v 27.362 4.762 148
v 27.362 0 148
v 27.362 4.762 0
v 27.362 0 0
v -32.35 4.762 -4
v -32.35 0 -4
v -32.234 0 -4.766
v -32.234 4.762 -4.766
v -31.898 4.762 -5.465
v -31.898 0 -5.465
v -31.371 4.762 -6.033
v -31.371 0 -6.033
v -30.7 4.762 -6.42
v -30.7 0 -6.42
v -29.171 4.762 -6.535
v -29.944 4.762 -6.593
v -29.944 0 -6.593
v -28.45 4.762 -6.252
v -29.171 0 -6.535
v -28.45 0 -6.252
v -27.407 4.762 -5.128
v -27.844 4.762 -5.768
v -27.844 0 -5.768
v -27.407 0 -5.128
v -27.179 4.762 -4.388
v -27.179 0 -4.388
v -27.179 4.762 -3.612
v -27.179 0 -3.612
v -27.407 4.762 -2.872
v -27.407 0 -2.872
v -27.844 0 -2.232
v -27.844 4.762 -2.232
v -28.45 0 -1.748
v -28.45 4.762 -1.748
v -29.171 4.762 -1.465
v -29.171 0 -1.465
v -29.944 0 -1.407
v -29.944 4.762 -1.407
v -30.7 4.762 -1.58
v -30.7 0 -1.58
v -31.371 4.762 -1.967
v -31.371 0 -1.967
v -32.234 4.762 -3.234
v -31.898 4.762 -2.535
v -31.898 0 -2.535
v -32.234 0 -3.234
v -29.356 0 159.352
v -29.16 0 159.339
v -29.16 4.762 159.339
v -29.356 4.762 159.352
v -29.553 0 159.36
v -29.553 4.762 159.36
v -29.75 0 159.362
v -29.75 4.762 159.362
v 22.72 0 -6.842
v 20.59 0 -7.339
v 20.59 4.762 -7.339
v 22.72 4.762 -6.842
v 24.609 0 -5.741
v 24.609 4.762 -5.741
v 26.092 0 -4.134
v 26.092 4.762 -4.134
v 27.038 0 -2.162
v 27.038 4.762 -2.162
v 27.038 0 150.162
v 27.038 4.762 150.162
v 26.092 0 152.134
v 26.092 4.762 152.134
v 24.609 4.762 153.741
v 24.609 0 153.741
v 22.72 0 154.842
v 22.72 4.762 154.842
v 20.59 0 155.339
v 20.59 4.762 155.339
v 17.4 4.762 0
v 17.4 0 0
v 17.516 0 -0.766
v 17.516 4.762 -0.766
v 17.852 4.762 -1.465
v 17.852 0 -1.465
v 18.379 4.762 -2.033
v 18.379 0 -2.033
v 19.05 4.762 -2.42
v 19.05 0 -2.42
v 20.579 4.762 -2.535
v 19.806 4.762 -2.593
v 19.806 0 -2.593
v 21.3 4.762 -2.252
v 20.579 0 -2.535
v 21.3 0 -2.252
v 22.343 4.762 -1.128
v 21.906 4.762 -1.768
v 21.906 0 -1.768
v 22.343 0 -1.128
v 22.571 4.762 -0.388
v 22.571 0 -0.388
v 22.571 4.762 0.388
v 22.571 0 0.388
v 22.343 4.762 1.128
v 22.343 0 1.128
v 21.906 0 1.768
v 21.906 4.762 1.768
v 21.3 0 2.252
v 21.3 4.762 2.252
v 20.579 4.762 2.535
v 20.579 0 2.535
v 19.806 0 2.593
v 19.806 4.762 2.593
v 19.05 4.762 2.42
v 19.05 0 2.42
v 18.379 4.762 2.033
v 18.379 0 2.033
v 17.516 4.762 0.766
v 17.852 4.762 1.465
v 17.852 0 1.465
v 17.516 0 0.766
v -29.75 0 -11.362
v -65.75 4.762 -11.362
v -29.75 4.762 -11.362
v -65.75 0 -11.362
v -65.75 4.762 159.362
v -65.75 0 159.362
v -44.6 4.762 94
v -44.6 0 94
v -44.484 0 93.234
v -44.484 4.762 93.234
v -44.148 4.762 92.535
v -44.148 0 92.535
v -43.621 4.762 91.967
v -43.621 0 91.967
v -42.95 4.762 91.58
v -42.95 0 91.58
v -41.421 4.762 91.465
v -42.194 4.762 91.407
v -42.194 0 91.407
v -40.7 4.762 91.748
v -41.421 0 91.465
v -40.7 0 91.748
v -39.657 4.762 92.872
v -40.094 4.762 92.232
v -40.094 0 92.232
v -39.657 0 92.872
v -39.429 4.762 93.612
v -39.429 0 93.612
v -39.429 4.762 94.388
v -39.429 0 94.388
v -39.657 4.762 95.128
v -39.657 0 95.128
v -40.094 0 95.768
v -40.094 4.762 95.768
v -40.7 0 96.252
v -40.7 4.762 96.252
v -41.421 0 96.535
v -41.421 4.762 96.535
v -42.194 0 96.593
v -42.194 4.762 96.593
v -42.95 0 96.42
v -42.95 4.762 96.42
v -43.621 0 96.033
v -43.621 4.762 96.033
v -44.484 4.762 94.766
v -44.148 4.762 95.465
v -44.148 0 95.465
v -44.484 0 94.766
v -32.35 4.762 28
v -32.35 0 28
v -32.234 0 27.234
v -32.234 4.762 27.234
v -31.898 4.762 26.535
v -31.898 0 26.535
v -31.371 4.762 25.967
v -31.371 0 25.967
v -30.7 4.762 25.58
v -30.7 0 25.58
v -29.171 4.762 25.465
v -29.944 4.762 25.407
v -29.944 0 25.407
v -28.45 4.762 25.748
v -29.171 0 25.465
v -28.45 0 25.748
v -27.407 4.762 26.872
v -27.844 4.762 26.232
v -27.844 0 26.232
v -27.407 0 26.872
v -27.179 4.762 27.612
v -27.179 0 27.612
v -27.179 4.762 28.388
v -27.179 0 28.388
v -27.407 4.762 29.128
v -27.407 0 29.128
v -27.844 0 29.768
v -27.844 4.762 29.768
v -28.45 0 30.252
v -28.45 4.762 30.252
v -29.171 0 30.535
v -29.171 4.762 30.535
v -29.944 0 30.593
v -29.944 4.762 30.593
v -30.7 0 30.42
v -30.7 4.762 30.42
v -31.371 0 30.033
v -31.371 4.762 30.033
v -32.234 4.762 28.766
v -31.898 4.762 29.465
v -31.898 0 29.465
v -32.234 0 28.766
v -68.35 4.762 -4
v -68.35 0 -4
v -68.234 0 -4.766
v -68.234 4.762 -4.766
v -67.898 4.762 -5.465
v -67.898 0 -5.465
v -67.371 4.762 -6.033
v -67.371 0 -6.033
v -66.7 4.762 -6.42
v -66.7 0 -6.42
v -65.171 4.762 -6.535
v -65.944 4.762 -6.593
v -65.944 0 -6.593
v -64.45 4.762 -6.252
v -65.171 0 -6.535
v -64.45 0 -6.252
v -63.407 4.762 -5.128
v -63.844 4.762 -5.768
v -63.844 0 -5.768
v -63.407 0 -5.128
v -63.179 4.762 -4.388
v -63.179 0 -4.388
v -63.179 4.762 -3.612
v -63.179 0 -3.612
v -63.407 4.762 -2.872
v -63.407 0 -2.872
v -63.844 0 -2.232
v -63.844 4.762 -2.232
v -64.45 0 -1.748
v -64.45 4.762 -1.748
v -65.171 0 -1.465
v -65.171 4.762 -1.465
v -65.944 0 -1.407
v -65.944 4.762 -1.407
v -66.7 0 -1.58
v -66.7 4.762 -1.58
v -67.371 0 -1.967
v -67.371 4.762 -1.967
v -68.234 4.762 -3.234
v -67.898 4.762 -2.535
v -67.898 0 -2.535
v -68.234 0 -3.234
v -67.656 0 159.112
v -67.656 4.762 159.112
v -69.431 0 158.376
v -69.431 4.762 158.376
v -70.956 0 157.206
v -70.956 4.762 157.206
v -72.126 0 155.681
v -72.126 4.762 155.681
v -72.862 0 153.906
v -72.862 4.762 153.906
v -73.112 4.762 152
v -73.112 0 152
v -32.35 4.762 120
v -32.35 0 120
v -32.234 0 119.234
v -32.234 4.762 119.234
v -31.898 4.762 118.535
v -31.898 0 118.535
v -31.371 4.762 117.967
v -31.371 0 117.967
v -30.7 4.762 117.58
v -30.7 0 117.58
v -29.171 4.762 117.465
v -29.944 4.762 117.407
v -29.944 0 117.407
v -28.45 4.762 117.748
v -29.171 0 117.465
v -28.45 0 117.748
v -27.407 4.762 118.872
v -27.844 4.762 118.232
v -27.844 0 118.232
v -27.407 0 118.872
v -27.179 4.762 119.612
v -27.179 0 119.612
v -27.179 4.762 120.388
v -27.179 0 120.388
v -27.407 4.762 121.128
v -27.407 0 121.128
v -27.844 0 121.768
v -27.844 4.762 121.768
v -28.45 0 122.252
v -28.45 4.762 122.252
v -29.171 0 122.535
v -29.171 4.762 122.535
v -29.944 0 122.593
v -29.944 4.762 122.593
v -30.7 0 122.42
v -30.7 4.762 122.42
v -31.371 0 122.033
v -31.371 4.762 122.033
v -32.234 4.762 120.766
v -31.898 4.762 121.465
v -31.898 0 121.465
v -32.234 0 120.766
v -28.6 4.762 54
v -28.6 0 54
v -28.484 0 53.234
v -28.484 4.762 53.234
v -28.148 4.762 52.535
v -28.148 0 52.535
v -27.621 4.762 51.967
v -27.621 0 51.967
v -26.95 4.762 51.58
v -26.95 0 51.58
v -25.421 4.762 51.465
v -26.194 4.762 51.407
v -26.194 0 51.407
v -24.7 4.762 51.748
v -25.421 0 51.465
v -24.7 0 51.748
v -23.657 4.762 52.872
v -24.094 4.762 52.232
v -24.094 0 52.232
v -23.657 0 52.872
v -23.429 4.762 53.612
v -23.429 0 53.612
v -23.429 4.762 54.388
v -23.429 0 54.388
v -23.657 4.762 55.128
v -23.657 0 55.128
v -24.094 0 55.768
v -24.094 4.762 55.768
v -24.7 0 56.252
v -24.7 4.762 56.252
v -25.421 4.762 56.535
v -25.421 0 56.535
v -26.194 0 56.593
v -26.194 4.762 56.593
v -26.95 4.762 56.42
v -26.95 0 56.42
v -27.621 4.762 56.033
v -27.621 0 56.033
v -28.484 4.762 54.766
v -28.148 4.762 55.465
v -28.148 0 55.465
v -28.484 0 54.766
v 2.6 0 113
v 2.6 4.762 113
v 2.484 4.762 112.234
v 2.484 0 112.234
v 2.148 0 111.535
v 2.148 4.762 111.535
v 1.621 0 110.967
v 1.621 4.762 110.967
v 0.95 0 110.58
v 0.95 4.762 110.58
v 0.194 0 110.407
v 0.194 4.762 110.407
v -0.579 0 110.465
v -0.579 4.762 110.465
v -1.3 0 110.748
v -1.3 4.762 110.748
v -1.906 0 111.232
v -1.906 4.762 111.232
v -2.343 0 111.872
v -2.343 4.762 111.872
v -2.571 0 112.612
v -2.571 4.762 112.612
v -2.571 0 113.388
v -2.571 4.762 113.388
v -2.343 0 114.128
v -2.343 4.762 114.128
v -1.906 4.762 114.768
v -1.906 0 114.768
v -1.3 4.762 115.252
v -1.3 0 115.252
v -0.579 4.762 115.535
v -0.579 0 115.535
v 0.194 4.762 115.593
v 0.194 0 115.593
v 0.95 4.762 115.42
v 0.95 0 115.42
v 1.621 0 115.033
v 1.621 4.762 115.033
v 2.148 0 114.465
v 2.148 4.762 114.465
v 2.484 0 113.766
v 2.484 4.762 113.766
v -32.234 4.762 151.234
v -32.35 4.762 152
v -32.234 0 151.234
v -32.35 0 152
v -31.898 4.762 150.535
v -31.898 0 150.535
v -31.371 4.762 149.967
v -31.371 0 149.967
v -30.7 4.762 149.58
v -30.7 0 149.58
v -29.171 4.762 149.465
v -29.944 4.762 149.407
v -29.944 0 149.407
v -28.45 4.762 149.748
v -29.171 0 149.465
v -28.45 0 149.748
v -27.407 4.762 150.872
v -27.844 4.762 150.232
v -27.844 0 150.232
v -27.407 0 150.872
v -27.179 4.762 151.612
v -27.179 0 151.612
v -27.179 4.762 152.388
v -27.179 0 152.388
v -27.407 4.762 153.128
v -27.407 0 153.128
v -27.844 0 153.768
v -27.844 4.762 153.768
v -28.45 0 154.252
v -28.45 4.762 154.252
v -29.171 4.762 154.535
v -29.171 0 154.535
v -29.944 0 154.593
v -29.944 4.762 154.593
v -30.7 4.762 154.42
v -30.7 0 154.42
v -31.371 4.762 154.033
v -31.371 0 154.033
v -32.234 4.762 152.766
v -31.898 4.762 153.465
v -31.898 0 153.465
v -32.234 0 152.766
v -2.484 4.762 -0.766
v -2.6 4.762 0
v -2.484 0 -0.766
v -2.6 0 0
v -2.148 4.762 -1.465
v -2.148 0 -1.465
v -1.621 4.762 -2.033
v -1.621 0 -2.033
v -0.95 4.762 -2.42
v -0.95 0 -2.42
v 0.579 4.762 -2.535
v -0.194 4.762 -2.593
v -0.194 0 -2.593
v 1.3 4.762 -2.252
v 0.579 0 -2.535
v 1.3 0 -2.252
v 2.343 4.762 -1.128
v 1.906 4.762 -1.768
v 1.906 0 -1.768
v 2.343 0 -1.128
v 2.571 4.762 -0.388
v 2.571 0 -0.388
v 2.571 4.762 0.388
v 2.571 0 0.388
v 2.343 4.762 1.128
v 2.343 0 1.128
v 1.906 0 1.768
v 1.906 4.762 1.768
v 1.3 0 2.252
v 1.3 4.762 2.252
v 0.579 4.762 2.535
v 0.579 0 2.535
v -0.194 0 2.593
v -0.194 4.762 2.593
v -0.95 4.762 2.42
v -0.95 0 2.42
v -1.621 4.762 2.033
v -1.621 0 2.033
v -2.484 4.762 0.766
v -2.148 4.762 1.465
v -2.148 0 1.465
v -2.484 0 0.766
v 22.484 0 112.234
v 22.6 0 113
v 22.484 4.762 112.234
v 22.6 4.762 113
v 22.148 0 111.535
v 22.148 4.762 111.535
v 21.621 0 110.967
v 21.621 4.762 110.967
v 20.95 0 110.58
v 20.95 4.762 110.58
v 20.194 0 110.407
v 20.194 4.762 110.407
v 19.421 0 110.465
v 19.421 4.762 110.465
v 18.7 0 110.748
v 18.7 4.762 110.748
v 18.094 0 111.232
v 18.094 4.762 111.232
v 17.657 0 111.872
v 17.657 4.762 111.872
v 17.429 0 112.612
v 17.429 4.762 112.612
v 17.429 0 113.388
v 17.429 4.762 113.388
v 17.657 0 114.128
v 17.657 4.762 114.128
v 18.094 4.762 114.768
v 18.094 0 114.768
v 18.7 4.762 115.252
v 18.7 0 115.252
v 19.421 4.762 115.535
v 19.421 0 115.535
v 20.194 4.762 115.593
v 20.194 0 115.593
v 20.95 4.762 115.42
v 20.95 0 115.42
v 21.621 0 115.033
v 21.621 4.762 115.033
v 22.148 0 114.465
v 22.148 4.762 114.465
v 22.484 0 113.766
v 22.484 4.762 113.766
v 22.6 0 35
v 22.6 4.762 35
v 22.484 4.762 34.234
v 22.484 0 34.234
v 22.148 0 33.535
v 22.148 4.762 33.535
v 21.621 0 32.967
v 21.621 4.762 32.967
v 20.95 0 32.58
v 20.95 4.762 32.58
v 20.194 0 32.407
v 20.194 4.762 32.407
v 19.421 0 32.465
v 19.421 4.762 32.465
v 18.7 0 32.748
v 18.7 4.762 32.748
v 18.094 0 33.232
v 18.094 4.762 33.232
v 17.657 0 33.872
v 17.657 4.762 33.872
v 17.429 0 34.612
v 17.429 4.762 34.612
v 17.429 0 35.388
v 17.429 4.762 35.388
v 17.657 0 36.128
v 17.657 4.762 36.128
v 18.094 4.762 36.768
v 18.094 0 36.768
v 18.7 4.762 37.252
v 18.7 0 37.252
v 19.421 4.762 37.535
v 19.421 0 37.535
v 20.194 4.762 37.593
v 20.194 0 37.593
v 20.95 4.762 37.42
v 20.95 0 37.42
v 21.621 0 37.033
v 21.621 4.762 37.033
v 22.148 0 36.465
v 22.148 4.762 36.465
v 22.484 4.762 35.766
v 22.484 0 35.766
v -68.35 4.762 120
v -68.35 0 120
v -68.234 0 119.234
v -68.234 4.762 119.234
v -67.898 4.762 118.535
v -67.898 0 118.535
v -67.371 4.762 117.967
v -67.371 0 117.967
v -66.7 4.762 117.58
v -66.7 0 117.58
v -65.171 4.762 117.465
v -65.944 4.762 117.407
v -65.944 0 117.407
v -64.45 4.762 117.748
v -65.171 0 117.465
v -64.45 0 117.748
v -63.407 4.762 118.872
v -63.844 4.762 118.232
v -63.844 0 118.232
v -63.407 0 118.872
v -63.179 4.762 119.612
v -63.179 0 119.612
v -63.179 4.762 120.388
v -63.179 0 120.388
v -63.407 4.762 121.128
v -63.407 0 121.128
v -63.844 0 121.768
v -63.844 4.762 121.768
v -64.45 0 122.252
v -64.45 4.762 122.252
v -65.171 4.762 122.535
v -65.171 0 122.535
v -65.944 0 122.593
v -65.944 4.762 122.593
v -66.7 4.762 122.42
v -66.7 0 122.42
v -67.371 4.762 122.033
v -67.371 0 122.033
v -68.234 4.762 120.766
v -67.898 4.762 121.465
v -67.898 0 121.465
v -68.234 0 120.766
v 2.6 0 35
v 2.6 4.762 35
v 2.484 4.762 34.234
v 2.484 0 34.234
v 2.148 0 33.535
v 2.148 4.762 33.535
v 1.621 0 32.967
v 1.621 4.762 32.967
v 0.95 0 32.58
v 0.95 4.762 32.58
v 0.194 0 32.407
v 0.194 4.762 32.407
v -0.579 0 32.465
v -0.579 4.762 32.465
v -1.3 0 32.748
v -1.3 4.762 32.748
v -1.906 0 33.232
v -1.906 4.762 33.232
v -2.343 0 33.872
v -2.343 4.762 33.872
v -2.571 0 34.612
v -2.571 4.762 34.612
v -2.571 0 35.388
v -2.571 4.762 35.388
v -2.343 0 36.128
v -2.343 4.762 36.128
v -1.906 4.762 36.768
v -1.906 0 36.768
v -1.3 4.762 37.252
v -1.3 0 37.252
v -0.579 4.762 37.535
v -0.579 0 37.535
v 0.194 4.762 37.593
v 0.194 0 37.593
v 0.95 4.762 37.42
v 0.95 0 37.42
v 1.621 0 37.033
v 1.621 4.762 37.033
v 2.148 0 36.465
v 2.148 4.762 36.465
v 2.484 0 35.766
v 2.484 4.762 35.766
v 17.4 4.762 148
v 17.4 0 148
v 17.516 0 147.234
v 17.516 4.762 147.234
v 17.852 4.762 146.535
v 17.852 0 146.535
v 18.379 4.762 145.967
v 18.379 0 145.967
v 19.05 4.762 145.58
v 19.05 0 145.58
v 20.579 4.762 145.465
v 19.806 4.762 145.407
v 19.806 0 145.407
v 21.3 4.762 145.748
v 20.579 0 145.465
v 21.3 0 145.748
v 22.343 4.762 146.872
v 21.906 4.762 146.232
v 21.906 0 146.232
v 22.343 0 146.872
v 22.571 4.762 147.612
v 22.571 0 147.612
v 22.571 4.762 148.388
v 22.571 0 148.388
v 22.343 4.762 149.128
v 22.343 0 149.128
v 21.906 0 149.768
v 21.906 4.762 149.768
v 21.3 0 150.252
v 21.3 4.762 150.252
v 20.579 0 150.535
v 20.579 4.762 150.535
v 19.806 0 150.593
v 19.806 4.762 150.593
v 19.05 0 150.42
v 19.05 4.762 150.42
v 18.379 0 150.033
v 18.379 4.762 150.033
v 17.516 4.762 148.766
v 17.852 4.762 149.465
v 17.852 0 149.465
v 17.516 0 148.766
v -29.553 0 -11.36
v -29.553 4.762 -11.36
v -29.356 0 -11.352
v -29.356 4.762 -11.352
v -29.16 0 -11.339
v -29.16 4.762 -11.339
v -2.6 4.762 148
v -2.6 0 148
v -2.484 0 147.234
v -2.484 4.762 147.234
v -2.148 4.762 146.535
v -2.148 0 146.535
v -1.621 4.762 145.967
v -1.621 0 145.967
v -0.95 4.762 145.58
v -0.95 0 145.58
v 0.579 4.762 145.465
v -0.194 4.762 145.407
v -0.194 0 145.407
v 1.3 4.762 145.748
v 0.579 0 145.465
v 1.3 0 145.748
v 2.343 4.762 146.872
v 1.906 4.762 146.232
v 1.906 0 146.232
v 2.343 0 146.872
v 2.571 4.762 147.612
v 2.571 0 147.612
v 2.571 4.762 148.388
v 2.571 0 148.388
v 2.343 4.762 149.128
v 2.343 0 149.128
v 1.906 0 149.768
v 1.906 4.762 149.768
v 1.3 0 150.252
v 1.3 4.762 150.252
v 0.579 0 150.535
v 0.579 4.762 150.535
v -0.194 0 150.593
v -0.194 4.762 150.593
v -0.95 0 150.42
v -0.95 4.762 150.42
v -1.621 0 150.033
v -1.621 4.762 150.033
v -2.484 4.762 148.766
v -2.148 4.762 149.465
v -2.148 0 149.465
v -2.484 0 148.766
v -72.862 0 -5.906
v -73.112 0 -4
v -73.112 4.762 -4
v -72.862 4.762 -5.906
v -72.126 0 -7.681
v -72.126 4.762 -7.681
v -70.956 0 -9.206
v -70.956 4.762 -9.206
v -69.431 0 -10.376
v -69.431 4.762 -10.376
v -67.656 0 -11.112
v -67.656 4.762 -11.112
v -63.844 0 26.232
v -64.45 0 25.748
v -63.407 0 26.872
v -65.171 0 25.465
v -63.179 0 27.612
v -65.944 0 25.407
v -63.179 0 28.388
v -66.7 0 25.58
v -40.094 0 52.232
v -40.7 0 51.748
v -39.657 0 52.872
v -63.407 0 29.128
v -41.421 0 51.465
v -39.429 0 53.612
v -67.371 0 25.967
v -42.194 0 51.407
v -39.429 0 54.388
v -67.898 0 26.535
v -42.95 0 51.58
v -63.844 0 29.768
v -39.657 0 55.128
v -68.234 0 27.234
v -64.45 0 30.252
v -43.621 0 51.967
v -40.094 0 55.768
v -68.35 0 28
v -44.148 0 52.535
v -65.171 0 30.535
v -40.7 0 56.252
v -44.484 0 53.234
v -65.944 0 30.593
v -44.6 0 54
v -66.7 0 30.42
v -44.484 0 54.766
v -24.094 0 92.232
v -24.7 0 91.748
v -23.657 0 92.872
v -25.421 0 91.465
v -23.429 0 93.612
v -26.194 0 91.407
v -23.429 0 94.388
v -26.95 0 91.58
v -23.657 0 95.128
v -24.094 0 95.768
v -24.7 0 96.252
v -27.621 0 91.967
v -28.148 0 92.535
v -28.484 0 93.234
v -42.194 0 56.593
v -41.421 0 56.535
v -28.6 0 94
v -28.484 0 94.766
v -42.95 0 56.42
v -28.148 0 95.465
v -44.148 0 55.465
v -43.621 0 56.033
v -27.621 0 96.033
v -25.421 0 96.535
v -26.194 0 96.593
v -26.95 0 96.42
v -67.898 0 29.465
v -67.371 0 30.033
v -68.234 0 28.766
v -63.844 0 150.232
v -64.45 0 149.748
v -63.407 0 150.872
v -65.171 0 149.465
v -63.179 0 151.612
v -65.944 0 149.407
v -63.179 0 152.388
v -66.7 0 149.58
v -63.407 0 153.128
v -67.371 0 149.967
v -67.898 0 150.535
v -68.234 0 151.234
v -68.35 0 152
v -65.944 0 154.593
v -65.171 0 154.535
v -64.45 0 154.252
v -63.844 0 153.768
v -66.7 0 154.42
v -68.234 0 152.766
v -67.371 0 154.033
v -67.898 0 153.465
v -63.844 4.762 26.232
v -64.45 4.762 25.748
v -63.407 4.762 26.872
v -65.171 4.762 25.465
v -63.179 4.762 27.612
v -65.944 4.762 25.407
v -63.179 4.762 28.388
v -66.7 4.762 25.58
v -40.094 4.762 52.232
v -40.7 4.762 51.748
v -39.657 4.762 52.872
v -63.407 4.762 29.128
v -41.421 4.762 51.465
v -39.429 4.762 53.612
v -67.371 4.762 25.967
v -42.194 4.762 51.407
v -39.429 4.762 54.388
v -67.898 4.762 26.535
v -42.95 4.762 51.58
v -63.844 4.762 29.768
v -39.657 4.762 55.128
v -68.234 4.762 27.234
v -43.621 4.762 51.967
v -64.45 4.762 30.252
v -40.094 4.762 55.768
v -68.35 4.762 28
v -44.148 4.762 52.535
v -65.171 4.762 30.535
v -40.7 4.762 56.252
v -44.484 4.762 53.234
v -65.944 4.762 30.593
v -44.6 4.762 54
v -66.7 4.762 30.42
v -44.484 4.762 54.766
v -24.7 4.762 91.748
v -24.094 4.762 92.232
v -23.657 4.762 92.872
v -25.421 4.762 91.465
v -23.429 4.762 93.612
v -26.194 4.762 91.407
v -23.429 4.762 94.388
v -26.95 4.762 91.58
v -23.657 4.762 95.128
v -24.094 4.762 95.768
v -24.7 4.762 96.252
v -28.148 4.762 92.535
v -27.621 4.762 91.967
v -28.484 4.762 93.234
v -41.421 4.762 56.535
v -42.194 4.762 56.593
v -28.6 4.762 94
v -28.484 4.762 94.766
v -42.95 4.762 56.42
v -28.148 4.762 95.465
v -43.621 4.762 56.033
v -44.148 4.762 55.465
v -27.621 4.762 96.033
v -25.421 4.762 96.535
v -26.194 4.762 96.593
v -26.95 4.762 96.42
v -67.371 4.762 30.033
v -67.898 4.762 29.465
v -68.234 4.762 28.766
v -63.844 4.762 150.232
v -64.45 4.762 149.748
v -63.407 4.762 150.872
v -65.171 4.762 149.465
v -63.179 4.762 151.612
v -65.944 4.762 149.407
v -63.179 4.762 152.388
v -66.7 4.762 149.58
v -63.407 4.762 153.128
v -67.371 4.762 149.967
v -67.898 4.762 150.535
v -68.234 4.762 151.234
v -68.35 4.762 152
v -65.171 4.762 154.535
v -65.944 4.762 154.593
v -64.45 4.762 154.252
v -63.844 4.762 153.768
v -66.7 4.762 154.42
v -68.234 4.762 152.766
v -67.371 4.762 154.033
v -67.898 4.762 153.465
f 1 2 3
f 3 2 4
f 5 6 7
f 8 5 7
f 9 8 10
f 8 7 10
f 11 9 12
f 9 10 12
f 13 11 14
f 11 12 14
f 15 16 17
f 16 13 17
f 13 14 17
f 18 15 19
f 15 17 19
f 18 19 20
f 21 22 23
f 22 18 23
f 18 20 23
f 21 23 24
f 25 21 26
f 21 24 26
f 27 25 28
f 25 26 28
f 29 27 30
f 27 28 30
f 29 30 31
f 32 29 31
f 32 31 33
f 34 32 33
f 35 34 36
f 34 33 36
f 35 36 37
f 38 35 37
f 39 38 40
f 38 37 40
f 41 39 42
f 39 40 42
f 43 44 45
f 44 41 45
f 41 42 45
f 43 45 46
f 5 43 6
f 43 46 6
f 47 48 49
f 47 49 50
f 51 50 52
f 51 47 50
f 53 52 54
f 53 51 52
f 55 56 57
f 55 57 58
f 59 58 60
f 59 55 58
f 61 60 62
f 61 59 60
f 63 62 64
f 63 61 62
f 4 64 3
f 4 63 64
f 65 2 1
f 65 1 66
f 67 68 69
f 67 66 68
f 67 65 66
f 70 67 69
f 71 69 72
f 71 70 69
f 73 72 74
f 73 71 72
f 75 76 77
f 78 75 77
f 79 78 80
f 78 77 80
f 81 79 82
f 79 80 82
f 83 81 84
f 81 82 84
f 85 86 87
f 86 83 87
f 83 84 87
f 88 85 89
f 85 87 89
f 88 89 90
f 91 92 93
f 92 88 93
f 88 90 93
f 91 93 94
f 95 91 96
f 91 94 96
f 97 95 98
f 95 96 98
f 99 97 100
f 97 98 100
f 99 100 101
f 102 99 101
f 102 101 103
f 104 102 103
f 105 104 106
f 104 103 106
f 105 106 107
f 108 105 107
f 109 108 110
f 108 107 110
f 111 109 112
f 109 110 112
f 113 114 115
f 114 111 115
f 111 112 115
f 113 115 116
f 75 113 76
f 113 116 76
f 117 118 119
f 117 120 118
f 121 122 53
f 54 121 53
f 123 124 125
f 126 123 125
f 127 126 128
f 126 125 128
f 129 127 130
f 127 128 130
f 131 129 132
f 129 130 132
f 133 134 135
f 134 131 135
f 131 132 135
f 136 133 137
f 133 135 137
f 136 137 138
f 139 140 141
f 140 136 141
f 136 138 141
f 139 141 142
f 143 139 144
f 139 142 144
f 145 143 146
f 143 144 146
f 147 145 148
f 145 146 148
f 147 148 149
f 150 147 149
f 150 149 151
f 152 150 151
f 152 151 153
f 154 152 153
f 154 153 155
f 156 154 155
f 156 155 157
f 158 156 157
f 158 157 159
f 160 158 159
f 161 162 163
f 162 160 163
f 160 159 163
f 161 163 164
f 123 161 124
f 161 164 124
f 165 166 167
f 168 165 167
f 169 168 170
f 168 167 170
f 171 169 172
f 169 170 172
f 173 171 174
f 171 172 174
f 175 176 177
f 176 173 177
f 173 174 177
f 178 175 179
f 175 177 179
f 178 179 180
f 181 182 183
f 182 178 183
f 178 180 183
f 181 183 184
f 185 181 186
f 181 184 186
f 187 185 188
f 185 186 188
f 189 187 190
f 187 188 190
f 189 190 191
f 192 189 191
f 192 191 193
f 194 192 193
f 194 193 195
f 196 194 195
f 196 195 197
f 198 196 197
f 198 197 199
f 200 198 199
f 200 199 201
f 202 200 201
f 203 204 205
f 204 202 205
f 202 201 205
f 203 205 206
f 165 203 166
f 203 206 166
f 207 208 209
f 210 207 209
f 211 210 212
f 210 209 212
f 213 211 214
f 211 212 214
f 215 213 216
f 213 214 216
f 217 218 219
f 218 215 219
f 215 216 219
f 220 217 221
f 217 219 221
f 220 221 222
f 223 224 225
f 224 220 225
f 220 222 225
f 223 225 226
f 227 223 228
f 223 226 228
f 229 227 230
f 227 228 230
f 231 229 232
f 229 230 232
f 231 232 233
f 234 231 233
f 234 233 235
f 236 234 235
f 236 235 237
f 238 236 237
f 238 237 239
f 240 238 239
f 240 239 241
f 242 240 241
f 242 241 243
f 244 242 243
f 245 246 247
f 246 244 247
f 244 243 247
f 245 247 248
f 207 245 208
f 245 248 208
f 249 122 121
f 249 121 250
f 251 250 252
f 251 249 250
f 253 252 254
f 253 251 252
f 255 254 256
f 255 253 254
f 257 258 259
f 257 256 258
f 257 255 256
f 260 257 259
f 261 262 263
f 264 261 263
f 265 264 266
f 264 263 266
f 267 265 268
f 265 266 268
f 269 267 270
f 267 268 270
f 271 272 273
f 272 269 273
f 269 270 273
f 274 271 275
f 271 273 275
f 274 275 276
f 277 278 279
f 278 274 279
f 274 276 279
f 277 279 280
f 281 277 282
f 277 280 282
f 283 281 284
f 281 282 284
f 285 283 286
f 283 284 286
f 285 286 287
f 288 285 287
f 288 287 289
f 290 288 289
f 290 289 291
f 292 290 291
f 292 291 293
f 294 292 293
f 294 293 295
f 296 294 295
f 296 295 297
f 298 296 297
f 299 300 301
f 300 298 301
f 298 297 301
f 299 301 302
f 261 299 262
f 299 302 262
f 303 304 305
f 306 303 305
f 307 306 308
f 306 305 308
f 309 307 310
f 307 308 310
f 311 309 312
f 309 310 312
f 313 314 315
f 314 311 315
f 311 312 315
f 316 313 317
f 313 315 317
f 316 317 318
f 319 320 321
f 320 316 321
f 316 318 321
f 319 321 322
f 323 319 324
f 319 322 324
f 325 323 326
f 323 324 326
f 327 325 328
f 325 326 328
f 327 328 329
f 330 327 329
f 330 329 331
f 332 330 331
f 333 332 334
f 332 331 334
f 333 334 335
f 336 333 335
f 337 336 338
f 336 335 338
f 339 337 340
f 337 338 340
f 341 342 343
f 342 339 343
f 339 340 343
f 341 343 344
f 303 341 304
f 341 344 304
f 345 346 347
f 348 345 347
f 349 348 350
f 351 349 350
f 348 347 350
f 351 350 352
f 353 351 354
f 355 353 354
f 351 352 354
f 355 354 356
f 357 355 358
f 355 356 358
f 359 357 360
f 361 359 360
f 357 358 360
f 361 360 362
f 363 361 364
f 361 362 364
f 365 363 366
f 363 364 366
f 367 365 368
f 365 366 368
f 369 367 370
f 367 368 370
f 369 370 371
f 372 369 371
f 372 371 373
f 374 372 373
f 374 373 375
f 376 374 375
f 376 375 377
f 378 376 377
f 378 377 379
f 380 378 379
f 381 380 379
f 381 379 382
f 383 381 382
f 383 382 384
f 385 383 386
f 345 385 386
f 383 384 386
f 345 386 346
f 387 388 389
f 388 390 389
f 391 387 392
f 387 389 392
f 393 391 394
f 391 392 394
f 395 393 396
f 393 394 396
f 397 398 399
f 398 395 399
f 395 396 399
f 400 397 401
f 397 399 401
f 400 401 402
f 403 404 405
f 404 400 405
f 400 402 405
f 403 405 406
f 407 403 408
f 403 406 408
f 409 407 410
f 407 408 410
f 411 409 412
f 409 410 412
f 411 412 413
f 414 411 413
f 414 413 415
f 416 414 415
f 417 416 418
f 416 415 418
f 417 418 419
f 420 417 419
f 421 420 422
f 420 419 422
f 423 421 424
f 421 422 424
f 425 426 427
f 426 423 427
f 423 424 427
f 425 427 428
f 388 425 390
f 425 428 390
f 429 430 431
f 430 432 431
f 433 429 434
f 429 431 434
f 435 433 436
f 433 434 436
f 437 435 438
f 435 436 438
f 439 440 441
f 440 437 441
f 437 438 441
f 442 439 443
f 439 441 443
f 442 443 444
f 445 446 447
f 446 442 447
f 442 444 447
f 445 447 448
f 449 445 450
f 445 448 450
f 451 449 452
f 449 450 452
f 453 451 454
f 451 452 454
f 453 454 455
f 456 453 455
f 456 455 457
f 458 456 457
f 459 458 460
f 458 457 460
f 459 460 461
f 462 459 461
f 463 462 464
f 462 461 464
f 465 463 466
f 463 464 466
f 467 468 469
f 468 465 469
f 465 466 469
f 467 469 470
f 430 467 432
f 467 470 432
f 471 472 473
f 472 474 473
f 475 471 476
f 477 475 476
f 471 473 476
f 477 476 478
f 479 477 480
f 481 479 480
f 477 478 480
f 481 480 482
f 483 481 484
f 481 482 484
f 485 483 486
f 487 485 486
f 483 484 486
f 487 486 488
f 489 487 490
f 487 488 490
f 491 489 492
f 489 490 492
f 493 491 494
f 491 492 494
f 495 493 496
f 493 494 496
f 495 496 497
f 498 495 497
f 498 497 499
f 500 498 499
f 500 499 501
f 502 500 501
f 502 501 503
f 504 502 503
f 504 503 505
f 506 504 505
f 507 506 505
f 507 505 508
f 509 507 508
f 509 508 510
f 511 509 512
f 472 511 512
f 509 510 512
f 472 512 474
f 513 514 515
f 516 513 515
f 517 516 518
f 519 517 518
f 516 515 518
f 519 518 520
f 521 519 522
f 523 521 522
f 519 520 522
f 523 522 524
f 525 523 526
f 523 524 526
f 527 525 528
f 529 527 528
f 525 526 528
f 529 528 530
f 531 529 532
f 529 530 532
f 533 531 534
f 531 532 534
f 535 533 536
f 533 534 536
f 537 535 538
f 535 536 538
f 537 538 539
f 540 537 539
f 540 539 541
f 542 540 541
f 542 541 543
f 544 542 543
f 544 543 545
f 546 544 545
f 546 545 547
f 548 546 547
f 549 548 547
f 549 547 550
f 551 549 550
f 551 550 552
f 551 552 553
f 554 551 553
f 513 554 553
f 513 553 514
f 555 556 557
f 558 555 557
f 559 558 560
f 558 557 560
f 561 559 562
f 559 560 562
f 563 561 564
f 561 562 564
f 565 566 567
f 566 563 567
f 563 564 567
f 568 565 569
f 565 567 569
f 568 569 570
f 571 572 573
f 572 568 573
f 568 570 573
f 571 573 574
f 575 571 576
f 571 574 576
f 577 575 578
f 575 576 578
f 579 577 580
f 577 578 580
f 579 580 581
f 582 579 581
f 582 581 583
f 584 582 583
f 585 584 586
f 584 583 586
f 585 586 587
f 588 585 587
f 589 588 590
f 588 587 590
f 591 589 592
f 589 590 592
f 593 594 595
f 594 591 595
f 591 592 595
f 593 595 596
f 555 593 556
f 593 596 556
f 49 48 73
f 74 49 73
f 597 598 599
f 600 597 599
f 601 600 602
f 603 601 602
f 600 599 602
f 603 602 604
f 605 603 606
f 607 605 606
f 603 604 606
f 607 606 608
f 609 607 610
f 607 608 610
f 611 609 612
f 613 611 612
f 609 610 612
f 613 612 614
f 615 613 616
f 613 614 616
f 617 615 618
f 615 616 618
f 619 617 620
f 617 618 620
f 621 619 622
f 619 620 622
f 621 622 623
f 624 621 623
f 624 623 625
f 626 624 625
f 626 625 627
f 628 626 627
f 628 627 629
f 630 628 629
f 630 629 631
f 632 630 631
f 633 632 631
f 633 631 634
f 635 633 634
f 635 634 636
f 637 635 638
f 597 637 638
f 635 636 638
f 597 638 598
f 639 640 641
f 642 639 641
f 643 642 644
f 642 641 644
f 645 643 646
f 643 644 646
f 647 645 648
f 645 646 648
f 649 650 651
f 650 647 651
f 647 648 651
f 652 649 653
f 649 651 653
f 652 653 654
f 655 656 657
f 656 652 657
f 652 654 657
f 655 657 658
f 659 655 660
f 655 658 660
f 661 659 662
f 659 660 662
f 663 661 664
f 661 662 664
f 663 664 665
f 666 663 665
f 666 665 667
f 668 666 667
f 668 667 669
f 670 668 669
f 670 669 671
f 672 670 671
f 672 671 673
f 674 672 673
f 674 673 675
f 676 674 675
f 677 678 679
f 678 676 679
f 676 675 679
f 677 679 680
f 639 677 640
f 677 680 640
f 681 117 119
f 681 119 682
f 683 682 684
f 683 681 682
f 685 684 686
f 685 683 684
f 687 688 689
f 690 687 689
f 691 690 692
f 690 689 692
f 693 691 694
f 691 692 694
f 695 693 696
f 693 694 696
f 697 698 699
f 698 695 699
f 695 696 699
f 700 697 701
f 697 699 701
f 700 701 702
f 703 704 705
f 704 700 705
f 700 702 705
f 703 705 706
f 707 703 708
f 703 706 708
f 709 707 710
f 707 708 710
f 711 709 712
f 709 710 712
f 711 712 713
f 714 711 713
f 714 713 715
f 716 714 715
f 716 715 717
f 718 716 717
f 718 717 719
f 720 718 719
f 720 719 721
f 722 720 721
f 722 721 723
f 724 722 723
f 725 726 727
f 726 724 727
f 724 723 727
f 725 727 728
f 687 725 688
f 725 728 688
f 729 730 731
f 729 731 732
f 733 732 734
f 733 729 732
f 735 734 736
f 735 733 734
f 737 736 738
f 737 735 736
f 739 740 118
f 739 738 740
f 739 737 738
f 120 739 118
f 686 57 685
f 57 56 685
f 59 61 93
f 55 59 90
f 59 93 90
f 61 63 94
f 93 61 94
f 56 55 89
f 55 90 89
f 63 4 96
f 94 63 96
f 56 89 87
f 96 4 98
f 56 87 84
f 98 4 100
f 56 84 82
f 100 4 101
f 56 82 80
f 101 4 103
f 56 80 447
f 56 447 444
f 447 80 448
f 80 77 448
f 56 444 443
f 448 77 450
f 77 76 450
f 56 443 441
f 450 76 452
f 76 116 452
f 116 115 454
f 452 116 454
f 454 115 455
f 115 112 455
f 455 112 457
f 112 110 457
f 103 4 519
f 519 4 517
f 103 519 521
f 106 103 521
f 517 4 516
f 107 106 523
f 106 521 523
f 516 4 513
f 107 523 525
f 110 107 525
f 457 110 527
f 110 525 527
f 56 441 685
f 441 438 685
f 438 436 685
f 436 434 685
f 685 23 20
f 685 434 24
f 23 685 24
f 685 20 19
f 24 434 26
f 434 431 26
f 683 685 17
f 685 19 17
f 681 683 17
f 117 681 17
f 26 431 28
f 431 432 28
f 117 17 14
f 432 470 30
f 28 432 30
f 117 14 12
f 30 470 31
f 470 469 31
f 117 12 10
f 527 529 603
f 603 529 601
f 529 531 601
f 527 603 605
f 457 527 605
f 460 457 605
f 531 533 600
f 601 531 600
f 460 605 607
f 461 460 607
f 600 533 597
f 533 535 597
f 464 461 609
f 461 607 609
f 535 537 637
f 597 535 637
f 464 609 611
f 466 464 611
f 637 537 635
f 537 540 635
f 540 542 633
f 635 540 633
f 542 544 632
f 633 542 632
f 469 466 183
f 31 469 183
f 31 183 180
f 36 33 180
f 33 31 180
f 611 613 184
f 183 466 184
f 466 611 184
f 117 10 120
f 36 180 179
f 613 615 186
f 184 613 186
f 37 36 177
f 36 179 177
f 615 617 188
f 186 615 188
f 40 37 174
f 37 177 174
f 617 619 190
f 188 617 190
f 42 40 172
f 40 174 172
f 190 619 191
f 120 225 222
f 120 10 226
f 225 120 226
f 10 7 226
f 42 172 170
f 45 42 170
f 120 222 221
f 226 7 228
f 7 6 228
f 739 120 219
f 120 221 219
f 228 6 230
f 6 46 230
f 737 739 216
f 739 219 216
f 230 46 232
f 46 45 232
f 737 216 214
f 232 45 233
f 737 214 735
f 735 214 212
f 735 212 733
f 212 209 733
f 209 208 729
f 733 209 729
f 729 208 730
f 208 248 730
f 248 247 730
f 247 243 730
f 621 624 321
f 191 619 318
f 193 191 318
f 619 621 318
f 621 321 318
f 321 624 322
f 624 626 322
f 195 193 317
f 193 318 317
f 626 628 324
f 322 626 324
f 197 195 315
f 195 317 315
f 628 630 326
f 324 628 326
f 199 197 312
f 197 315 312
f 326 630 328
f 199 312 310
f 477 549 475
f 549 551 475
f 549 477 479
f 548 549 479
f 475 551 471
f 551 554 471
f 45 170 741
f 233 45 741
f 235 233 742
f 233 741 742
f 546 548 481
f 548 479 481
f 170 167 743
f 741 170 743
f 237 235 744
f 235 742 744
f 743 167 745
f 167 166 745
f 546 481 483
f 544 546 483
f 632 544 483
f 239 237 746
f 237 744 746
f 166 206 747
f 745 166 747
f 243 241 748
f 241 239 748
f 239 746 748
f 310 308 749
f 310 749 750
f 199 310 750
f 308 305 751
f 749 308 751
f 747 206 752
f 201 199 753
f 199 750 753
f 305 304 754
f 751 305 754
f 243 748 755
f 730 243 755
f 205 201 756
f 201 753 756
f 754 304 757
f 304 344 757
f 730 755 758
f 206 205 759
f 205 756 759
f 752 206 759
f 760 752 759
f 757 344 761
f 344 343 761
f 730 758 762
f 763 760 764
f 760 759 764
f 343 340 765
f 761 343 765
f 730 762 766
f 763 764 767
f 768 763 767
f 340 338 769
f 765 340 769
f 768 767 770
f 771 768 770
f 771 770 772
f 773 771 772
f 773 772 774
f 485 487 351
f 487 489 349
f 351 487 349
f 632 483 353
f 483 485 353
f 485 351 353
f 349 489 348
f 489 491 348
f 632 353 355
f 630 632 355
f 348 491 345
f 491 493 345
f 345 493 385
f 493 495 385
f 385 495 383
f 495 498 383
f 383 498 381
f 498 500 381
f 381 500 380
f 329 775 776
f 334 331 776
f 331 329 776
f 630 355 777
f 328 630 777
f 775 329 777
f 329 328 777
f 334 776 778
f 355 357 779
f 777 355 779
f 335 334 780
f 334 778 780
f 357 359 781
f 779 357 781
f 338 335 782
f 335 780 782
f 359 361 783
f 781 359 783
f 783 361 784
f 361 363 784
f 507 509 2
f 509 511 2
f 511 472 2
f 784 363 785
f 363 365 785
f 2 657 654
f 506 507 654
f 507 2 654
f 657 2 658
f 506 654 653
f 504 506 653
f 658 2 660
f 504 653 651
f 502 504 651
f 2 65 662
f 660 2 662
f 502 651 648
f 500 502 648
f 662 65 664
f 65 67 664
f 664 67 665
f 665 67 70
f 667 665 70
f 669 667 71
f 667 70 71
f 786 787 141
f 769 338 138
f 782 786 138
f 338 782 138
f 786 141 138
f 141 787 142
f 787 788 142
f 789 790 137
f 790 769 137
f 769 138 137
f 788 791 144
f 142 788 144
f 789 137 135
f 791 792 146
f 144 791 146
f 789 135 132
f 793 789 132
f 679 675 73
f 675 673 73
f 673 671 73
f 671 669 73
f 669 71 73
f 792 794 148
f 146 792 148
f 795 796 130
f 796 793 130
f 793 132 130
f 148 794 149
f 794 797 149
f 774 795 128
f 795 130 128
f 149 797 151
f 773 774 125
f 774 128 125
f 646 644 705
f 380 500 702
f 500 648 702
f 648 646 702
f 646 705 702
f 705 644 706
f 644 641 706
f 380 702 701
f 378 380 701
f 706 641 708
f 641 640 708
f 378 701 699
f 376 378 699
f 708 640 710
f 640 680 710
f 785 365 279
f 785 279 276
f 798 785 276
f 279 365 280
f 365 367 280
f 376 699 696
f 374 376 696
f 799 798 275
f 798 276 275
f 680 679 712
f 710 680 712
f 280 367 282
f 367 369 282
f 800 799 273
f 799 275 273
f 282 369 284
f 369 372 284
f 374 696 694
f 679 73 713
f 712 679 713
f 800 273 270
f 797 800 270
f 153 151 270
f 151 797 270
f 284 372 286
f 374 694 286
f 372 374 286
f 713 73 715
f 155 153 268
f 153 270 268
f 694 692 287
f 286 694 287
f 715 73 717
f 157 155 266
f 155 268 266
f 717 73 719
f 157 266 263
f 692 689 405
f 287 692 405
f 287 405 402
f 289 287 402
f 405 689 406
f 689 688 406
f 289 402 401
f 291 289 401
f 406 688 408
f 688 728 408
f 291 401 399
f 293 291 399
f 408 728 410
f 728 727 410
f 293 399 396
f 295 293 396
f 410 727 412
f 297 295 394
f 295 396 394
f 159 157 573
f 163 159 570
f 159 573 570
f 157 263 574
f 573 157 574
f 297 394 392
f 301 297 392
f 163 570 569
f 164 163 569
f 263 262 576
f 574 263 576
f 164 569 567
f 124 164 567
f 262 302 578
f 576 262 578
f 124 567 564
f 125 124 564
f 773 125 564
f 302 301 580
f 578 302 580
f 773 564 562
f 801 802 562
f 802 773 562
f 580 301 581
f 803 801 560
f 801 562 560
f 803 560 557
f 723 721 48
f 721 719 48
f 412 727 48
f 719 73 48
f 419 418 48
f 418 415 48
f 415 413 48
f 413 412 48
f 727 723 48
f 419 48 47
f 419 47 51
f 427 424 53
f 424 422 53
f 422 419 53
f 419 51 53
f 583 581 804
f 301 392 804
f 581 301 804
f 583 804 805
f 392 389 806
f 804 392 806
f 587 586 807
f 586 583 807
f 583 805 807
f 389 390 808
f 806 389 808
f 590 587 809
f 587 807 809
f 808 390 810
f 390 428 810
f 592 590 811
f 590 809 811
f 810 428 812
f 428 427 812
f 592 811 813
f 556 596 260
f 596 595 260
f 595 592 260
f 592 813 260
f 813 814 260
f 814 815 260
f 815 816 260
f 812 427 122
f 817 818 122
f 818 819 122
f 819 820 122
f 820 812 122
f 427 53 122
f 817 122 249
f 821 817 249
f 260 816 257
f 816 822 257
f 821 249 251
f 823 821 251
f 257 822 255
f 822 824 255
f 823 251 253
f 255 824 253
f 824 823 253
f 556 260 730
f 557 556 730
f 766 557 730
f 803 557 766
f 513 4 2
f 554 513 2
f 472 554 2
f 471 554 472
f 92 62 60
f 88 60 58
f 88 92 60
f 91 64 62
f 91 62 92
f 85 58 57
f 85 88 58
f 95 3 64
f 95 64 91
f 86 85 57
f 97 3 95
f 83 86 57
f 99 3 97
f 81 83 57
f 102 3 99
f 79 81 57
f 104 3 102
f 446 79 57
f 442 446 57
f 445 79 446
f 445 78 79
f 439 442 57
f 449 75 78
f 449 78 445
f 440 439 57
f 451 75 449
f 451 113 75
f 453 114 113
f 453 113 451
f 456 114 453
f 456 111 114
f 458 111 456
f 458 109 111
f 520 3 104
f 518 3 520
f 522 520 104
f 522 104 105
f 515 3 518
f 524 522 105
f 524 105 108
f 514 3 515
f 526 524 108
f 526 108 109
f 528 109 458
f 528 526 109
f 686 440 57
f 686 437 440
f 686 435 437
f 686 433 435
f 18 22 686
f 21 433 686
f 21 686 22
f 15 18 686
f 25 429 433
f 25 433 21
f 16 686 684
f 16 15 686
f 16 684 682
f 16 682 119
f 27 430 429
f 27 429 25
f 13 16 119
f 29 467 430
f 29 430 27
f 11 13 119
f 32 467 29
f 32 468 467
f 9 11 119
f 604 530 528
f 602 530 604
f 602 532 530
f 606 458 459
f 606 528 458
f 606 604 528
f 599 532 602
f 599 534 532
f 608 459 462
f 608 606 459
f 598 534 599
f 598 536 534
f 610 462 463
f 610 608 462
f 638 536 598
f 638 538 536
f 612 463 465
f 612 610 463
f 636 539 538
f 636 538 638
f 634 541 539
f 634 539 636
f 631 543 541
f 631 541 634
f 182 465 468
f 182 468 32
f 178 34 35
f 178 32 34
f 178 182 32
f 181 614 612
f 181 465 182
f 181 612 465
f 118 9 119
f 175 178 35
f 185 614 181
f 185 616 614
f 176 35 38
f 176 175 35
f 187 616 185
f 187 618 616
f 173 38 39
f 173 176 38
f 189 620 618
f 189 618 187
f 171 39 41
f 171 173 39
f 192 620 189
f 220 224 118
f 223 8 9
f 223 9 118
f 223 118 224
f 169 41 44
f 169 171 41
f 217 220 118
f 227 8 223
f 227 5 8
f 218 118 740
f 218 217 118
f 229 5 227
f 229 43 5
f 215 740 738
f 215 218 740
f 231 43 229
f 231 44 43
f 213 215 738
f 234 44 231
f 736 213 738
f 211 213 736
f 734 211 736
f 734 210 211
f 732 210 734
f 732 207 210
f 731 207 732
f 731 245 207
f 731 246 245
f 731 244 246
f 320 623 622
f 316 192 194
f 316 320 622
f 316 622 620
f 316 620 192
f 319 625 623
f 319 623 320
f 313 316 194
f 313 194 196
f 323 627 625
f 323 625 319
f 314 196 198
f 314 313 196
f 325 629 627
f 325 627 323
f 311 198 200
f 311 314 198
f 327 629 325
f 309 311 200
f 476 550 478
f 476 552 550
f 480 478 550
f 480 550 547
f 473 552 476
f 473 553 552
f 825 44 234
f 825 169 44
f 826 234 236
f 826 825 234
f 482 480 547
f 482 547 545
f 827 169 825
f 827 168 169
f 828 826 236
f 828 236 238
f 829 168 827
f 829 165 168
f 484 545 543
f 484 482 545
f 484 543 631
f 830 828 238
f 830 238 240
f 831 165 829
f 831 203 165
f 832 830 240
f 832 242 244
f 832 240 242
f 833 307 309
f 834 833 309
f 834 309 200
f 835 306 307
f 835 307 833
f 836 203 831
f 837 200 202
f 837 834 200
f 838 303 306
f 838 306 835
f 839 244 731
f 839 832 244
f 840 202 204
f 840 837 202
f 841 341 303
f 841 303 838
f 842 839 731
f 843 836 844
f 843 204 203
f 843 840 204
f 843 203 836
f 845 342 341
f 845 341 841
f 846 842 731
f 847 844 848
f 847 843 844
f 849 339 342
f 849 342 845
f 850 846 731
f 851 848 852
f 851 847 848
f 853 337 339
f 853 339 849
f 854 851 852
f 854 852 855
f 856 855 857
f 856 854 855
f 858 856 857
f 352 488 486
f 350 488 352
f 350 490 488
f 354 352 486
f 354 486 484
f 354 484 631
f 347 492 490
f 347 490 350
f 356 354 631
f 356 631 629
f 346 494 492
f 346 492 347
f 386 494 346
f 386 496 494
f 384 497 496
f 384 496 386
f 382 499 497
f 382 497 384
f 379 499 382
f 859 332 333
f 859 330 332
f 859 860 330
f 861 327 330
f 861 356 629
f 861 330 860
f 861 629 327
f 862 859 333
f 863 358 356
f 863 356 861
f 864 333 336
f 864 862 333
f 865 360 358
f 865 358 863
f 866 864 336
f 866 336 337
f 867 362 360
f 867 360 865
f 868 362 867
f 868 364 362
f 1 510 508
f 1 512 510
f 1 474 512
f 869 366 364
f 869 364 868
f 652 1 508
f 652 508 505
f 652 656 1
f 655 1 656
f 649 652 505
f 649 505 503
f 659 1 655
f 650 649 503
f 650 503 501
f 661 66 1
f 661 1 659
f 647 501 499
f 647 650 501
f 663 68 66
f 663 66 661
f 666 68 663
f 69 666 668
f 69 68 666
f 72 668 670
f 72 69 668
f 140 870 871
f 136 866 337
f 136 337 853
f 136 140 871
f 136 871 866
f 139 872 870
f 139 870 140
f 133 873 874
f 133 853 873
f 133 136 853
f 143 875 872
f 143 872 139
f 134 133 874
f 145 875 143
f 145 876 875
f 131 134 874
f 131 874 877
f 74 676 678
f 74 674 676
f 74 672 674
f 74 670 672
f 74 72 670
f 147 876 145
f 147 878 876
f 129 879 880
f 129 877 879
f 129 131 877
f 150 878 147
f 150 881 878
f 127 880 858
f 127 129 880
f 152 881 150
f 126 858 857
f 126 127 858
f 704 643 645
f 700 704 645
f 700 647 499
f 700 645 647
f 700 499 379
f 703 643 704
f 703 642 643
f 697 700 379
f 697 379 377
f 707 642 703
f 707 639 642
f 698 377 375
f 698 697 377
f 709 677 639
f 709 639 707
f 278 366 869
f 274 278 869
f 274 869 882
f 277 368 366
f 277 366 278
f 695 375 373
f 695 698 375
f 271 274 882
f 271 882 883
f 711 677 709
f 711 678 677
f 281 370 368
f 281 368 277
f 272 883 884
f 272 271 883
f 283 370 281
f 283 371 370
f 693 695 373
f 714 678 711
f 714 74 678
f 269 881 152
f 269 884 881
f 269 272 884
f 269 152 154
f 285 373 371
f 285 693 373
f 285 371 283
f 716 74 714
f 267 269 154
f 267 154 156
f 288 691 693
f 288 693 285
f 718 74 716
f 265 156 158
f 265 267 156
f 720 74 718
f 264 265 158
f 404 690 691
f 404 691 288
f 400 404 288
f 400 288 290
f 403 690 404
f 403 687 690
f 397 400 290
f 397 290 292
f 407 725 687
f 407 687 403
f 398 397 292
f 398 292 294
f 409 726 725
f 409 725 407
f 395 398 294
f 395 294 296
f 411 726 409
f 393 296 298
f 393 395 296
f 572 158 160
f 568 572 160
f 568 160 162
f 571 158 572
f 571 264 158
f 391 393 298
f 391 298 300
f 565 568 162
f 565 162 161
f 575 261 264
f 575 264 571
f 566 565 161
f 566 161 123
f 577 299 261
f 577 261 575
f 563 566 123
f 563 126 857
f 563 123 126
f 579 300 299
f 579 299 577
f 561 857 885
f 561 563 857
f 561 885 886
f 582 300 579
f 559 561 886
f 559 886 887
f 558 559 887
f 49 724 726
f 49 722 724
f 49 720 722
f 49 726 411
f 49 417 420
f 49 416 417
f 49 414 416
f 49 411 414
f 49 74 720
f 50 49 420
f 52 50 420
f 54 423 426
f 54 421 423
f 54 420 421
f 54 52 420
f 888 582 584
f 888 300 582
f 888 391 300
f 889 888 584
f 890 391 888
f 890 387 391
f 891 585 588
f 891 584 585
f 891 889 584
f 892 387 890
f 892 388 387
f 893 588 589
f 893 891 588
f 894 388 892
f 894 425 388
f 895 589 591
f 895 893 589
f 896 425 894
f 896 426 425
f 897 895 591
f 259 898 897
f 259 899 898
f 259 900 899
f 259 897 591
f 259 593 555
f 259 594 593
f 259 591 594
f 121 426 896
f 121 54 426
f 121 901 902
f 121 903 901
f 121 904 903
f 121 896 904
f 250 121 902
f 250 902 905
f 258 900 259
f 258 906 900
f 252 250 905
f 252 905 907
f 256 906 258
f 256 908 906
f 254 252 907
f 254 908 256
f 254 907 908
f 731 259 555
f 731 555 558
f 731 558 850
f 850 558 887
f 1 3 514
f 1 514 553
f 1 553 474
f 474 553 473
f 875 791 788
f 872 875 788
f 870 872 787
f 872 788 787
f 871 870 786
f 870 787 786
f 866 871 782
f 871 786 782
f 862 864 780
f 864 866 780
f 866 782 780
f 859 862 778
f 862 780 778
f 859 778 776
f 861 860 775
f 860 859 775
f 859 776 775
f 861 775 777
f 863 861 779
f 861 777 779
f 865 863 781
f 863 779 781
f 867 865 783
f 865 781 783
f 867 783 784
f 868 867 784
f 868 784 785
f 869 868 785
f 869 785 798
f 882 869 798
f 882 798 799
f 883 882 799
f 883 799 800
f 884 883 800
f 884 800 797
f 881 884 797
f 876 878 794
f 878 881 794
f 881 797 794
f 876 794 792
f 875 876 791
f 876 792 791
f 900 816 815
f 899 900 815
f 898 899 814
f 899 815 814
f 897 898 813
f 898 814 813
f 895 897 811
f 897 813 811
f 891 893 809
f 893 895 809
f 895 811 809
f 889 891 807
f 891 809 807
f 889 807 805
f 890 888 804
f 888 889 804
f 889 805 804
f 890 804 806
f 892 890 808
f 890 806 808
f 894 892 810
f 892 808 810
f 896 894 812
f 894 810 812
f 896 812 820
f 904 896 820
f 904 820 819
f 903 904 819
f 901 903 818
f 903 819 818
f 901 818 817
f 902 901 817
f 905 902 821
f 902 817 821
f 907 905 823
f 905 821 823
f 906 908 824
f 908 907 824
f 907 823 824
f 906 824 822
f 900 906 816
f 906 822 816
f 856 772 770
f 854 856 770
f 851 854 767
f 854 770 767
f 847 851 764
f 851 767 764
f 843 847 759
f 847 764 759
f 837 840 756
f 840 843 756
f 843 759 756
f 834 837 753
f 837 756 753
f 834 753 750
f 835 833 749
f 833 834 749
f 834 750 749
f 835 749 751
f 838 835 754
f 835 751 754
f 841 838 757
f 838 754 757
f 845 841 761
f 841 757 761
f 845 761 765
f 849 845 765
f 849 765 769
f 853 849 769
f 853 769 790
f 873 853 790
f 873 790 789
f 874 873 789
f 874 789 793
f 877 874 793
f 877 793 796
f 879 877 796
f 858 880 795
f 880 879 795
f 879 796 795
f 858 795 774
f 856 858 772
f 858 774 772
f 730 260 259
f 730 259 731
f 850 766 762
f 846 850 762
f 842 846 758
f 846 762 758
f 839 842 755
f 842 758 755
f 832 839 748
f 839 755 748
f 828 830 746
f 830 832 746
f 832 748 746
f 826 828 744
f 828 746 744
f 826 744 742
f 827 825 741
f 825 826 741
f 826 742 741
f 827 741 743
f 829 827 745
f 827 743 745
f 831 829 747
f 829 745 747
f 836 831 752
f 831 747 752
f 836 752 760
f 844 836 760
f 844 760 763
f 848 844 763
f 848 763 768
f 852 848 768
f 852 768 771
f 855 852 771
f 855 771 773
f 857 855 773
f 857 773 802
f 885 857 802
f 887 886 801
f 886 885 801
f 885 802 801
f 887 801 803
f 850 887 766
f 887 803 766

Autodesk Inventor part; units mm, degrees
ref_plane "YZ Plane" through (0, 0, 0) normal (1, 0, 0) x (0, 1, 0)
ref_plane "XZ Plane" through (0, 0, 0) normal (0, 1, 0) x (-1, 0, 0)
sketch "Sketch1" plane through (0, 0, 0) normal (0, 1, 0) x (-1, 0, 0)
  circle A0 centre (0, 0) radius 2.6
  circle A1 centre (-20, 0) radius 2.6
  circle A2 centre (0, 148) radius 2.6
  circle A3 centre (-20, 148) radius 2.6
  circle A4 centre (29.75, -4) radius 2.6
  line L0 (29.75, -4) -> (29.75, -1.4) construction
  line L1 (29.75, -4) -> (32.35, -4) construction
  circle A5 centre (29.75, 28) radius 2.6
  circle A6 centre (65.75, -4) radius 2.6
  circle A7 centre (65.75, 28) radius 2.6
  line L2 (0, 74) -> (-20, 74) construction
  circle A8 centre (26, 54) radius 2.6
  circle A9 centre (42, 54) radius 2.6
  circle A10 centre (26, 94) radius 2.6
  circle A11 centre (42, 94) radius 2.6
  circle A12 centre (29.75, 152) radius 2.6
  circle A13 centre (29.75, 120) radius 2.6
  circle A14 centre (65.75, 152) radius 2.6
  circle A15 centre (65.75, 120) radius 2.6
  circle A16 centre (65.75, -4) radius 7.3625 construction
  circle A17 centre (65.75, 152) radius 7.3625 construction
  circle A18 centre (29.75, 152) radius 7.3625 construction
  circle A19 centre (-20, 148) radius 7.3625 construction
  circle A20 centre (-20, 0) radius 7.3625 construction
  circle A21 centre (29.75, -4) radius 7.3625 construction
  line L3 (73.1125, 152) -> (73.1125, -4)
  line L4 (65.75, -11.3625) -> (29.75, -11.3625)
  line L5 (-20.5901, -7.3388) -> (29.1599, -11.3388)
  line L6 (65.75, 159.3625) -> (29.75, 159.3625)
  line L7 (29.1599, 159.3388) -> (-20.5901, 155.3388)
  line L8 (-27.3625, 148) -> (-27.3625, 0)
  arc A22 (65.75, -11.3625) -> (73.1125, -4) centre (65.75, -4) ccw
  arc A23 (73.1125, 152) -> (65.75, 159.3625) centre (65.75, 152) ccw
  arc A24 (29.75, 159.3625) -> (29.1599, 159.3388) centre (29.75, 152) ccw
  arc A25 (-27.3625, 0) -> (-20.5901, -7.3388) centre (-20, 0) ccw
  arc A26 (-20.5901, 155.3388) -> (-27.3625, 148) centre (-20, 148) ccw
  arc A27 (29.1599, -11.3388) -> (29.75, -11.3625) centre (29.75, -4) ccw
  point P0 (29.75, 30.6)
  point P1 (32.35, 28)
  point P2 (65.75, -1.4)
  point P3 (68.35, -4)
  point P4 (65.75, 30.6)
  point P5 (68.35, 28)
  dimension "d0" = 5.2
  dimension "d1" = 20
  dimension "d2" = 148
  dimension "d3" = 4
  dimension "d4" = 29.75
  dimension "d7" = 32
  dimension "d10" = 36
  dimension "d13" = 74
  dimension "d18" = 16
  dimension "d21" = 40
  dimension "d24" = 20
  dimension "d25" = 26
  dimension "d26" = 4.7625
extrude "Extrusion1" add sketch "Sketch1" along normal blind 4.7625
ref_plane "Work Plane1" through (-65.75, 0, 74) normal (0, 0, 1) x (1, 0, 0)
sketch "Sketch3" plane through (0, 4.7625, 0) normal (0, 1, 0) x (1, 0, 0)
  arc A0 (-29.75, -159.3625) -> (-29.1599, -159.3388) centre (-29.75, -152) ccw projected
  line L0 (-29.1599, -159.3388) -> (20.5901, -155.3388) projected
  arc A1 (20.5901, -155.3388) -> (27.3625, -148) centre (20, -148) ccw projected
  line L1 (27.3625, -148) -> (27.3625, 0) projected
  arc A2 (27.3625, 0) -> (20.5901, 7.3388) centre (20, 0) ccw projected
  line L2 (20.5901, 7.3388) -> (-29.1599, 11.3388) projected
  arc A3 (-29.1599, 11.3388) -> (-29.75, 11.3625) centre (-29.75, 4) ccw projected
  line L3 (-29.75, 11.3625) -> (-65.75, 11.3625) projected
  arc A4 (-65.75, 11.3625) -> (-73.1125, 4) centre (-65.75, 4) ccw projected
  line L4 (-73.1125, 4) -> (-73.1125, -152) projected
  arc A5 (-73.1125, -152) -> (-65.75, -159.3625) centre (-65.75, -152) ccw projected
  line L5 (-65.75, -159.3625) -> (-29.75, -159.3625) projected
  circle A6 centre (-29.75, -152) radius 2.6 projected
  circle A7 centre (-65.75, -120) radius 2.6 projected
  circle A8 centre (-26, -94) radius 2.6 projected
  circle A9 centre (-42, -54) radius 2.6 projected
  circle A10 centre (-26, -54) radius 2.6 projected
  circle A11 centre (-65.75, -28) radius 2.6 projected
  circle A12 centre (-29.75, -28) radius 2.6 projected
  circle A13 centre (-29.75, 4) radius 2.6 projected
  circle A14 centre (0, -148) radius 2.6 projected
  circle A15 centre (0, 0) radius 2.6 projected
  circle A16 centre (-42, -94) radius 2.6 projected
  circle A17 centre (-29.75, -120) radius 2.6 projected
  circle A18 centre (-65.75, -152) radius 2.6 projected
  circle A19 centre (-65.75, 4) radius 2.6 projected
  circle A20 centre (20, -148) radius 2.6 projected
  circle A21 centre (20, 0) radius 2.6 projected
  circle A22 centre (0, -113) radius 2.6
  circle A23 centre (20, -113) radius 2.6
  circle A24 centre (0, 0) radius 2.6 projected
  line L6 (-73.1125, -74) -> (27.3625, -74) construction
  line L7 (27.3625, -148) -> (27.3625, 0) construction
  circle A25 centre (0, -35) radius 2.6
  circle A26 centre (20, -35) radius 2.6
  dimension "d56" = 148
  dimension "d60" = 35
  dimension "d61" = 74
extrude "Extrusion3" cut sketch "Sketch3" against normal through all contours A22 | A23
extrude "Extrusion4" cut sketch "Sketch3" against normal through all contours A25 | A26
equation "\"d13\" = 0.5 * d2"
equation "\"d24\" = 0.5 * d21"
properties part number "CNC-014-ZAxisSubMount1" material "Aluminum 5052"
